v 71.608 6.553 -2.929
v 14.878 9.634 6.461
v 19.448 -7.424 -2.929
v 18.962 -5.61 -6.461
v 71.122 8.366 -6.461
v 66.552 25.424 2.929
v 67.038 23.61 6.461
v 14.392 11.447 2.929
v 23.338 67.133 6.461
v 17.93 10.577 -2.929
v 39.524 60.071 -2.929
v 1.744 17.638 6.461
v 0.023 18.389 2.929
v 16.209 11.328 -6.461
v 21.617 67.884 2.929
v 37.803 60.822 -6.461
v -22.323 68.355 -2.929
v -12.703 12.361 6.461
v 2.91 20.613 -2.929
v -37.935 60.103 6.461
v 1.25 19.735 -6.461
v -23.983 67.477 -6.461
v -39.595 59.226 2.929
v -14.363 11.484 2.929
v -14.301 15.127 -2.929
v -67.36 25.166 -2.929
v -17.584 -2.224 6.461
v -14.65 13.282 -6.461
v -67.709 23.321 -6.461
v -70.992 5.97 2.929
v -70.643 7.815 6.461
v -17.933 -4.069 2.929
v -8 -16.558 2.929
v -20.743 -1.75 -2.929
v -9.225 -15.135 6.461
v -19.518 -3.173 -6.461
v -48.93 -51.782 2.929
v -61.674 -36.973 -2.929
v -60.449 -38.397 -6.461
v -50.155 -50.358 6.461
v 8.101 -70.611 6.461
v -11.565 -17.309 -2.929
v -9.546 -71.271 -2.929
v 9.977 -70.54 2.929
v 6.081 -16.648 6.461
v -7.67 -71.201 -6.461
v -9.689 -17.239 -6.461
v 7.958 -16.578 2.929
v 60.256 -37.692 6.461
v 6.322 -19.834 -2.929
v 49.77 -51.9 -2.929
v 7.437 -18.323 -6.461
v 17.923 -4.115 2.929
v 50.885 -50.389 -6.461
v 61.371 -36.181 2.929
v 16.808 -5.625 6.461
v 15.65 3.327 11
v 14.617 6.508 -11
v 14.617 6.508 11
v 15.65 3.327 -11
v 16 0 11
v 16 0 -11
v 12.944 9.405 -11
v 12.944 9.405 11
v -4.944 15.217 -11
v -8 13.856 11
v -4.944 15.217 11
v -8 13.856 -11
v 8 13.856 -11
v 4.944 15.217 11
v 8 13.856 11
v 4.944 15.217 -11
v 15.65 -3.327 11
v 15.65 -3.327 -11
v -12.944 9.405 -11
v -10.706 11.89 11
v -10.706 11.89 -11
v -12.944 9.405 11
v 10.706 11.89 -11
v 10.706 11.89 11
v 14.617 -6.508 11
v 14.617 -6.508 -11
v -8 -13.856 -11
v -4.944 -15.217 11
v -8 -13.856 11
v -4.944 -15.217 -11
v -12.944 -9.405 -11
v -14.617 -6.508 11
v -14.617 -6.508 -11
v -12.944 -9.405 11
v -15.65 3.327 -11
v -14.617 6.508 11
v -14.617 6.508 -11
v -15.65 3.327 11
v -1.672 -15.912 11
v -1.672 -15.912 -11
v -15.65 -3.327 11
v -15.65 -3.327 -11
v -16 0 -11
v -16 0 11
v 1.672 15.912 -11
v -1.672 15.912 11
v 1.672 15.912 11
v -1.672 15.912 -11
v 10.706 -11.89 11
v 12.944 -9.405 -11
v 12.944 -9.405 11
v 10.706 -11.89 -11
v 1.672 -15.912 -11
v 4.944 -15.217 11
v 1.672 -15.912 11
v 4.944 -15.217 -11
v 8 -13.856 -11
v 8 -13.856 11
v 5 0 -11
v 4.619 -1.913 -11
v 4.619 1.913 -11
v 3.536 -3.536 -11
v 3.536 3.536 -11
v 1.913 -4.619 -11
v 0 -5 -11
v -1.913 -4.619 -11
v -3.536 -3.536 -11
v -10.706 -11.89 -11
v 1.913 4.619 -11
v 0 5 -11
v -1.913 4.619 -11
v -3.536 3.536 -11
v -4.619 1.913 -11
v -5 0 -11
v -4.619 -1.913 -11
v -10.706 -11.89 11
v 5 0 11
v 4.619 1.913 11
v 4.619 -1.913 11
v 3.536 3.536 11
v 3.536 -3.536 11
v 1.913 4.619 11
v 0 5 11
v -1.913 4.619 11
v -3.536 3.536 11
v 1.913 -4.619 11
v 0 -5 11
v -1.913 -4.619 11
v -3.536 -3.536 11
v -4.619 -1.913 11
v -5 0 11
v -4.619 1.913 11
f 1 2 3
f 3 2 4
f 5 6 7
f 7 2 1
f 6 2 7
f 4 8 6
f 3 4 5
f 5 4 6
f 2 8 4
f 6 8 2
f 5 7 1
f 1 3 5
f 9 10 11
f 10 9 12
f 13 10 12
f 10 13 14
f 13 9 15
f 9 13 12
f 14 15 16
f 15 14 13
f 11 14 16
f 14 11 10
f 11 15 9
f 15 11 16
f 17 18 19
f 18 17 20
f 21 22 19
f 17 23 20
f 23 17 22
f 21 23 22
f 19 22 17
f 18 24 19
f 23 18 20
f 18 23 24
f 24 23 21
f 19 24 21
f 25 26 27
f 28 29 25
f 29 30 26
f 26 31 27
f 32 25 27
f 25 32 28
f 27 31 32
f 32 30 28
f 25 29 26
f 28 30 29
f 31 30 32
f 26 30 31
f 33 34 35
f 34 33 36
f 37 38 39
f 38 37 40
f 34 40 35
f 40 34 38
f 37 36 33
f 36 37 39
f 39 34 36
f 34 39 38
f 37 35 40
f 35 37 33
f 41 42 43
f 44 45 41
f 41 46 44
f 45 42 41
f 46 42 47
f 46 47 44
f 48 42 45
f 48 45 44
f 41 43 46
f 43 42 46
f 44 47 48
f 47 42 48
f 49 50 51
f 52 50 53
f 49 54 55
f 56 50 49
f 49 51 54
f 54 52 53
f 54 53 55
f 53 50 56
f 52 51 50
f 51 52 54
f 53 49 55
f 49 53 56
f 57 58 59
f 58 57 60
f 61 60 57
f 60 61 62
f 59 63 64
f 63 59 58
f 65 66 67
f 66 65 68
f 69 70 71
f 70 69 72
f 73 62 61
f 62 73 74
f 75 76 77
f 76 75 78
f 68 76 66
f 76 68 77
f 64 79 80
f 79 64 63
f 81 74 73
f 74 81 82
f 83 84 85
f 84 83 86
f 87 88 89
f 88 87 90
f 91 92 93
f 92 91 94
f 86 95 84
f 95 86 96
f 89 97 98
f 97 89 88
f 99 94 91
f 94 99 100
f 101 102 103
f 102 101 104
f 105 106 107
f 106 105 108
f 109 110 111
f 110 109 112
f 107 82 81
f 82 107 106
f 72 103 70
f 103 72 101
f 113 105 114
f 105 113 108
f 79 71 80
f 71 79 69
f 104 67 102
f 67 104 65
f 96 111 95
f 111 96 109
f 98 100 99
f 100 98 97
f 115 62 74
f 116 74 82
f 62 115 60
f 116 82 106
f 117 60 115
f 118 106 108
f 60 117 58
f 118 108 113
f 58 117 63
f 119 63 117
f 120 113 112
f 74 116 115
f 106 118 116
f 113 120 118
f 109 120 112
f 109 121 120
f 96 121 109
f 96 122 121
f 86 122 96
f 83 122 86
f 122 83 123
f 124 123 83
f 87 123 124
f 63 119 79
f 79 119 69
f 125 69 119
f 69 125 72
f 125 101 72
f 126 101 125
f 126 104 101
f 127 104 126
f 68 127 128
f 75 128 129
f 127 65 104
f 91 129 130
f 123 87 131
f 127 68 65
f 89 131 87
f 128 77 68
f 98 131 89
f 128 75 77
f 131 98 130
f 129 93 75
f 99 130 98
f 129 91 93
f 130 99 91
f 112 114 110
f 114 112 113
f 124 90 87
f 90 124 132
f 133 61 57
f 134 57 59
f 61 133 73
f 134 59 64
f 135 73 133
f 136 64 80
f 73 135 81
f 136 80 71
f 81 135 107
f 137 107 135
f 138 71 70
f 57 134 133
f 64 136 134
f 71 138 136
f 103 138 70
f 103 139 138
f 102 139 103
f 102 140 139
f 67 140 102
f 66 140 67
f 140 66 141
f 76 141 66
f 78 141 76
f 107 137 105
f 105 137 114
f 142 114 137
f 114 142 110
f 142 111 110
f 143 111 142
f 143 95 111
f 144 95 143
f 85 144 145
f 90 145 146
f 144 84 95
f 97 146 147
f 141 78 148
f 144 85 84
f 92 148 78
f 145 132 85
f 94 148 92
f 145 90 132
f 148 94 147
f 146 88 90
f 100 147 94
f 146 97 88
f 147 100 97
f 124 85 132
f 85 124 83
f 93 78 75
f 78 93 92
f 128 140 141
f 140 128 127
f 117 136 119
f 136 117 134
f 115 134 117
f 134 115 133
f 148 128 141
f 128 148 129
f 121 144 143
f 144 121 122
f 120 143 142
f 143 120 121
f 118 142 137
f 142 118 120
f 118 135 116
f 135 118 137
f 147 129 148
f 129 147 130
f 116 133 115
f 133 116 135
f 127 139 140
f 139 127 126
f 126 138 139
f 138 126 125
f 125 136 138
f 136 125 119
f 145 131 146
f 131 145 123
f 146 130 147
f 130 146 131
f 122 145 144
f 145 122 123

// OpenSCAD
// 3DScad sample: axial cooling fan with swept blades
// Uses only the currently round-trippable subset.

module scene_model() {
    hub_r = 16;
    hub_h = 22;
    blade_count = 7;
    blade_l = 54;
    blade_w = 20;
    blade_h = 4;
    blade_pitch = 28;
    bore_r = 5;

    difference() {
        union() {
            cylinder(h=hub_h, r=hub_r, center=true);
            for (i = [0 : 1 : blade_count - 1]) {
                rotate([0, 0, i * 360 / blade_count]) {
                    translate([hub_r + blade_l / 2, blade_l / 6, 0]) {
                        rotate([blade_pitch, 0, 15]) {
                            cube([blade_l, blade_w, blade_h], center=true);
                        }
                    }
                }
            }
        }
        cylinder(h=hub_h + 2, r=bore_r, center=true);
    }
}

scene_model();
